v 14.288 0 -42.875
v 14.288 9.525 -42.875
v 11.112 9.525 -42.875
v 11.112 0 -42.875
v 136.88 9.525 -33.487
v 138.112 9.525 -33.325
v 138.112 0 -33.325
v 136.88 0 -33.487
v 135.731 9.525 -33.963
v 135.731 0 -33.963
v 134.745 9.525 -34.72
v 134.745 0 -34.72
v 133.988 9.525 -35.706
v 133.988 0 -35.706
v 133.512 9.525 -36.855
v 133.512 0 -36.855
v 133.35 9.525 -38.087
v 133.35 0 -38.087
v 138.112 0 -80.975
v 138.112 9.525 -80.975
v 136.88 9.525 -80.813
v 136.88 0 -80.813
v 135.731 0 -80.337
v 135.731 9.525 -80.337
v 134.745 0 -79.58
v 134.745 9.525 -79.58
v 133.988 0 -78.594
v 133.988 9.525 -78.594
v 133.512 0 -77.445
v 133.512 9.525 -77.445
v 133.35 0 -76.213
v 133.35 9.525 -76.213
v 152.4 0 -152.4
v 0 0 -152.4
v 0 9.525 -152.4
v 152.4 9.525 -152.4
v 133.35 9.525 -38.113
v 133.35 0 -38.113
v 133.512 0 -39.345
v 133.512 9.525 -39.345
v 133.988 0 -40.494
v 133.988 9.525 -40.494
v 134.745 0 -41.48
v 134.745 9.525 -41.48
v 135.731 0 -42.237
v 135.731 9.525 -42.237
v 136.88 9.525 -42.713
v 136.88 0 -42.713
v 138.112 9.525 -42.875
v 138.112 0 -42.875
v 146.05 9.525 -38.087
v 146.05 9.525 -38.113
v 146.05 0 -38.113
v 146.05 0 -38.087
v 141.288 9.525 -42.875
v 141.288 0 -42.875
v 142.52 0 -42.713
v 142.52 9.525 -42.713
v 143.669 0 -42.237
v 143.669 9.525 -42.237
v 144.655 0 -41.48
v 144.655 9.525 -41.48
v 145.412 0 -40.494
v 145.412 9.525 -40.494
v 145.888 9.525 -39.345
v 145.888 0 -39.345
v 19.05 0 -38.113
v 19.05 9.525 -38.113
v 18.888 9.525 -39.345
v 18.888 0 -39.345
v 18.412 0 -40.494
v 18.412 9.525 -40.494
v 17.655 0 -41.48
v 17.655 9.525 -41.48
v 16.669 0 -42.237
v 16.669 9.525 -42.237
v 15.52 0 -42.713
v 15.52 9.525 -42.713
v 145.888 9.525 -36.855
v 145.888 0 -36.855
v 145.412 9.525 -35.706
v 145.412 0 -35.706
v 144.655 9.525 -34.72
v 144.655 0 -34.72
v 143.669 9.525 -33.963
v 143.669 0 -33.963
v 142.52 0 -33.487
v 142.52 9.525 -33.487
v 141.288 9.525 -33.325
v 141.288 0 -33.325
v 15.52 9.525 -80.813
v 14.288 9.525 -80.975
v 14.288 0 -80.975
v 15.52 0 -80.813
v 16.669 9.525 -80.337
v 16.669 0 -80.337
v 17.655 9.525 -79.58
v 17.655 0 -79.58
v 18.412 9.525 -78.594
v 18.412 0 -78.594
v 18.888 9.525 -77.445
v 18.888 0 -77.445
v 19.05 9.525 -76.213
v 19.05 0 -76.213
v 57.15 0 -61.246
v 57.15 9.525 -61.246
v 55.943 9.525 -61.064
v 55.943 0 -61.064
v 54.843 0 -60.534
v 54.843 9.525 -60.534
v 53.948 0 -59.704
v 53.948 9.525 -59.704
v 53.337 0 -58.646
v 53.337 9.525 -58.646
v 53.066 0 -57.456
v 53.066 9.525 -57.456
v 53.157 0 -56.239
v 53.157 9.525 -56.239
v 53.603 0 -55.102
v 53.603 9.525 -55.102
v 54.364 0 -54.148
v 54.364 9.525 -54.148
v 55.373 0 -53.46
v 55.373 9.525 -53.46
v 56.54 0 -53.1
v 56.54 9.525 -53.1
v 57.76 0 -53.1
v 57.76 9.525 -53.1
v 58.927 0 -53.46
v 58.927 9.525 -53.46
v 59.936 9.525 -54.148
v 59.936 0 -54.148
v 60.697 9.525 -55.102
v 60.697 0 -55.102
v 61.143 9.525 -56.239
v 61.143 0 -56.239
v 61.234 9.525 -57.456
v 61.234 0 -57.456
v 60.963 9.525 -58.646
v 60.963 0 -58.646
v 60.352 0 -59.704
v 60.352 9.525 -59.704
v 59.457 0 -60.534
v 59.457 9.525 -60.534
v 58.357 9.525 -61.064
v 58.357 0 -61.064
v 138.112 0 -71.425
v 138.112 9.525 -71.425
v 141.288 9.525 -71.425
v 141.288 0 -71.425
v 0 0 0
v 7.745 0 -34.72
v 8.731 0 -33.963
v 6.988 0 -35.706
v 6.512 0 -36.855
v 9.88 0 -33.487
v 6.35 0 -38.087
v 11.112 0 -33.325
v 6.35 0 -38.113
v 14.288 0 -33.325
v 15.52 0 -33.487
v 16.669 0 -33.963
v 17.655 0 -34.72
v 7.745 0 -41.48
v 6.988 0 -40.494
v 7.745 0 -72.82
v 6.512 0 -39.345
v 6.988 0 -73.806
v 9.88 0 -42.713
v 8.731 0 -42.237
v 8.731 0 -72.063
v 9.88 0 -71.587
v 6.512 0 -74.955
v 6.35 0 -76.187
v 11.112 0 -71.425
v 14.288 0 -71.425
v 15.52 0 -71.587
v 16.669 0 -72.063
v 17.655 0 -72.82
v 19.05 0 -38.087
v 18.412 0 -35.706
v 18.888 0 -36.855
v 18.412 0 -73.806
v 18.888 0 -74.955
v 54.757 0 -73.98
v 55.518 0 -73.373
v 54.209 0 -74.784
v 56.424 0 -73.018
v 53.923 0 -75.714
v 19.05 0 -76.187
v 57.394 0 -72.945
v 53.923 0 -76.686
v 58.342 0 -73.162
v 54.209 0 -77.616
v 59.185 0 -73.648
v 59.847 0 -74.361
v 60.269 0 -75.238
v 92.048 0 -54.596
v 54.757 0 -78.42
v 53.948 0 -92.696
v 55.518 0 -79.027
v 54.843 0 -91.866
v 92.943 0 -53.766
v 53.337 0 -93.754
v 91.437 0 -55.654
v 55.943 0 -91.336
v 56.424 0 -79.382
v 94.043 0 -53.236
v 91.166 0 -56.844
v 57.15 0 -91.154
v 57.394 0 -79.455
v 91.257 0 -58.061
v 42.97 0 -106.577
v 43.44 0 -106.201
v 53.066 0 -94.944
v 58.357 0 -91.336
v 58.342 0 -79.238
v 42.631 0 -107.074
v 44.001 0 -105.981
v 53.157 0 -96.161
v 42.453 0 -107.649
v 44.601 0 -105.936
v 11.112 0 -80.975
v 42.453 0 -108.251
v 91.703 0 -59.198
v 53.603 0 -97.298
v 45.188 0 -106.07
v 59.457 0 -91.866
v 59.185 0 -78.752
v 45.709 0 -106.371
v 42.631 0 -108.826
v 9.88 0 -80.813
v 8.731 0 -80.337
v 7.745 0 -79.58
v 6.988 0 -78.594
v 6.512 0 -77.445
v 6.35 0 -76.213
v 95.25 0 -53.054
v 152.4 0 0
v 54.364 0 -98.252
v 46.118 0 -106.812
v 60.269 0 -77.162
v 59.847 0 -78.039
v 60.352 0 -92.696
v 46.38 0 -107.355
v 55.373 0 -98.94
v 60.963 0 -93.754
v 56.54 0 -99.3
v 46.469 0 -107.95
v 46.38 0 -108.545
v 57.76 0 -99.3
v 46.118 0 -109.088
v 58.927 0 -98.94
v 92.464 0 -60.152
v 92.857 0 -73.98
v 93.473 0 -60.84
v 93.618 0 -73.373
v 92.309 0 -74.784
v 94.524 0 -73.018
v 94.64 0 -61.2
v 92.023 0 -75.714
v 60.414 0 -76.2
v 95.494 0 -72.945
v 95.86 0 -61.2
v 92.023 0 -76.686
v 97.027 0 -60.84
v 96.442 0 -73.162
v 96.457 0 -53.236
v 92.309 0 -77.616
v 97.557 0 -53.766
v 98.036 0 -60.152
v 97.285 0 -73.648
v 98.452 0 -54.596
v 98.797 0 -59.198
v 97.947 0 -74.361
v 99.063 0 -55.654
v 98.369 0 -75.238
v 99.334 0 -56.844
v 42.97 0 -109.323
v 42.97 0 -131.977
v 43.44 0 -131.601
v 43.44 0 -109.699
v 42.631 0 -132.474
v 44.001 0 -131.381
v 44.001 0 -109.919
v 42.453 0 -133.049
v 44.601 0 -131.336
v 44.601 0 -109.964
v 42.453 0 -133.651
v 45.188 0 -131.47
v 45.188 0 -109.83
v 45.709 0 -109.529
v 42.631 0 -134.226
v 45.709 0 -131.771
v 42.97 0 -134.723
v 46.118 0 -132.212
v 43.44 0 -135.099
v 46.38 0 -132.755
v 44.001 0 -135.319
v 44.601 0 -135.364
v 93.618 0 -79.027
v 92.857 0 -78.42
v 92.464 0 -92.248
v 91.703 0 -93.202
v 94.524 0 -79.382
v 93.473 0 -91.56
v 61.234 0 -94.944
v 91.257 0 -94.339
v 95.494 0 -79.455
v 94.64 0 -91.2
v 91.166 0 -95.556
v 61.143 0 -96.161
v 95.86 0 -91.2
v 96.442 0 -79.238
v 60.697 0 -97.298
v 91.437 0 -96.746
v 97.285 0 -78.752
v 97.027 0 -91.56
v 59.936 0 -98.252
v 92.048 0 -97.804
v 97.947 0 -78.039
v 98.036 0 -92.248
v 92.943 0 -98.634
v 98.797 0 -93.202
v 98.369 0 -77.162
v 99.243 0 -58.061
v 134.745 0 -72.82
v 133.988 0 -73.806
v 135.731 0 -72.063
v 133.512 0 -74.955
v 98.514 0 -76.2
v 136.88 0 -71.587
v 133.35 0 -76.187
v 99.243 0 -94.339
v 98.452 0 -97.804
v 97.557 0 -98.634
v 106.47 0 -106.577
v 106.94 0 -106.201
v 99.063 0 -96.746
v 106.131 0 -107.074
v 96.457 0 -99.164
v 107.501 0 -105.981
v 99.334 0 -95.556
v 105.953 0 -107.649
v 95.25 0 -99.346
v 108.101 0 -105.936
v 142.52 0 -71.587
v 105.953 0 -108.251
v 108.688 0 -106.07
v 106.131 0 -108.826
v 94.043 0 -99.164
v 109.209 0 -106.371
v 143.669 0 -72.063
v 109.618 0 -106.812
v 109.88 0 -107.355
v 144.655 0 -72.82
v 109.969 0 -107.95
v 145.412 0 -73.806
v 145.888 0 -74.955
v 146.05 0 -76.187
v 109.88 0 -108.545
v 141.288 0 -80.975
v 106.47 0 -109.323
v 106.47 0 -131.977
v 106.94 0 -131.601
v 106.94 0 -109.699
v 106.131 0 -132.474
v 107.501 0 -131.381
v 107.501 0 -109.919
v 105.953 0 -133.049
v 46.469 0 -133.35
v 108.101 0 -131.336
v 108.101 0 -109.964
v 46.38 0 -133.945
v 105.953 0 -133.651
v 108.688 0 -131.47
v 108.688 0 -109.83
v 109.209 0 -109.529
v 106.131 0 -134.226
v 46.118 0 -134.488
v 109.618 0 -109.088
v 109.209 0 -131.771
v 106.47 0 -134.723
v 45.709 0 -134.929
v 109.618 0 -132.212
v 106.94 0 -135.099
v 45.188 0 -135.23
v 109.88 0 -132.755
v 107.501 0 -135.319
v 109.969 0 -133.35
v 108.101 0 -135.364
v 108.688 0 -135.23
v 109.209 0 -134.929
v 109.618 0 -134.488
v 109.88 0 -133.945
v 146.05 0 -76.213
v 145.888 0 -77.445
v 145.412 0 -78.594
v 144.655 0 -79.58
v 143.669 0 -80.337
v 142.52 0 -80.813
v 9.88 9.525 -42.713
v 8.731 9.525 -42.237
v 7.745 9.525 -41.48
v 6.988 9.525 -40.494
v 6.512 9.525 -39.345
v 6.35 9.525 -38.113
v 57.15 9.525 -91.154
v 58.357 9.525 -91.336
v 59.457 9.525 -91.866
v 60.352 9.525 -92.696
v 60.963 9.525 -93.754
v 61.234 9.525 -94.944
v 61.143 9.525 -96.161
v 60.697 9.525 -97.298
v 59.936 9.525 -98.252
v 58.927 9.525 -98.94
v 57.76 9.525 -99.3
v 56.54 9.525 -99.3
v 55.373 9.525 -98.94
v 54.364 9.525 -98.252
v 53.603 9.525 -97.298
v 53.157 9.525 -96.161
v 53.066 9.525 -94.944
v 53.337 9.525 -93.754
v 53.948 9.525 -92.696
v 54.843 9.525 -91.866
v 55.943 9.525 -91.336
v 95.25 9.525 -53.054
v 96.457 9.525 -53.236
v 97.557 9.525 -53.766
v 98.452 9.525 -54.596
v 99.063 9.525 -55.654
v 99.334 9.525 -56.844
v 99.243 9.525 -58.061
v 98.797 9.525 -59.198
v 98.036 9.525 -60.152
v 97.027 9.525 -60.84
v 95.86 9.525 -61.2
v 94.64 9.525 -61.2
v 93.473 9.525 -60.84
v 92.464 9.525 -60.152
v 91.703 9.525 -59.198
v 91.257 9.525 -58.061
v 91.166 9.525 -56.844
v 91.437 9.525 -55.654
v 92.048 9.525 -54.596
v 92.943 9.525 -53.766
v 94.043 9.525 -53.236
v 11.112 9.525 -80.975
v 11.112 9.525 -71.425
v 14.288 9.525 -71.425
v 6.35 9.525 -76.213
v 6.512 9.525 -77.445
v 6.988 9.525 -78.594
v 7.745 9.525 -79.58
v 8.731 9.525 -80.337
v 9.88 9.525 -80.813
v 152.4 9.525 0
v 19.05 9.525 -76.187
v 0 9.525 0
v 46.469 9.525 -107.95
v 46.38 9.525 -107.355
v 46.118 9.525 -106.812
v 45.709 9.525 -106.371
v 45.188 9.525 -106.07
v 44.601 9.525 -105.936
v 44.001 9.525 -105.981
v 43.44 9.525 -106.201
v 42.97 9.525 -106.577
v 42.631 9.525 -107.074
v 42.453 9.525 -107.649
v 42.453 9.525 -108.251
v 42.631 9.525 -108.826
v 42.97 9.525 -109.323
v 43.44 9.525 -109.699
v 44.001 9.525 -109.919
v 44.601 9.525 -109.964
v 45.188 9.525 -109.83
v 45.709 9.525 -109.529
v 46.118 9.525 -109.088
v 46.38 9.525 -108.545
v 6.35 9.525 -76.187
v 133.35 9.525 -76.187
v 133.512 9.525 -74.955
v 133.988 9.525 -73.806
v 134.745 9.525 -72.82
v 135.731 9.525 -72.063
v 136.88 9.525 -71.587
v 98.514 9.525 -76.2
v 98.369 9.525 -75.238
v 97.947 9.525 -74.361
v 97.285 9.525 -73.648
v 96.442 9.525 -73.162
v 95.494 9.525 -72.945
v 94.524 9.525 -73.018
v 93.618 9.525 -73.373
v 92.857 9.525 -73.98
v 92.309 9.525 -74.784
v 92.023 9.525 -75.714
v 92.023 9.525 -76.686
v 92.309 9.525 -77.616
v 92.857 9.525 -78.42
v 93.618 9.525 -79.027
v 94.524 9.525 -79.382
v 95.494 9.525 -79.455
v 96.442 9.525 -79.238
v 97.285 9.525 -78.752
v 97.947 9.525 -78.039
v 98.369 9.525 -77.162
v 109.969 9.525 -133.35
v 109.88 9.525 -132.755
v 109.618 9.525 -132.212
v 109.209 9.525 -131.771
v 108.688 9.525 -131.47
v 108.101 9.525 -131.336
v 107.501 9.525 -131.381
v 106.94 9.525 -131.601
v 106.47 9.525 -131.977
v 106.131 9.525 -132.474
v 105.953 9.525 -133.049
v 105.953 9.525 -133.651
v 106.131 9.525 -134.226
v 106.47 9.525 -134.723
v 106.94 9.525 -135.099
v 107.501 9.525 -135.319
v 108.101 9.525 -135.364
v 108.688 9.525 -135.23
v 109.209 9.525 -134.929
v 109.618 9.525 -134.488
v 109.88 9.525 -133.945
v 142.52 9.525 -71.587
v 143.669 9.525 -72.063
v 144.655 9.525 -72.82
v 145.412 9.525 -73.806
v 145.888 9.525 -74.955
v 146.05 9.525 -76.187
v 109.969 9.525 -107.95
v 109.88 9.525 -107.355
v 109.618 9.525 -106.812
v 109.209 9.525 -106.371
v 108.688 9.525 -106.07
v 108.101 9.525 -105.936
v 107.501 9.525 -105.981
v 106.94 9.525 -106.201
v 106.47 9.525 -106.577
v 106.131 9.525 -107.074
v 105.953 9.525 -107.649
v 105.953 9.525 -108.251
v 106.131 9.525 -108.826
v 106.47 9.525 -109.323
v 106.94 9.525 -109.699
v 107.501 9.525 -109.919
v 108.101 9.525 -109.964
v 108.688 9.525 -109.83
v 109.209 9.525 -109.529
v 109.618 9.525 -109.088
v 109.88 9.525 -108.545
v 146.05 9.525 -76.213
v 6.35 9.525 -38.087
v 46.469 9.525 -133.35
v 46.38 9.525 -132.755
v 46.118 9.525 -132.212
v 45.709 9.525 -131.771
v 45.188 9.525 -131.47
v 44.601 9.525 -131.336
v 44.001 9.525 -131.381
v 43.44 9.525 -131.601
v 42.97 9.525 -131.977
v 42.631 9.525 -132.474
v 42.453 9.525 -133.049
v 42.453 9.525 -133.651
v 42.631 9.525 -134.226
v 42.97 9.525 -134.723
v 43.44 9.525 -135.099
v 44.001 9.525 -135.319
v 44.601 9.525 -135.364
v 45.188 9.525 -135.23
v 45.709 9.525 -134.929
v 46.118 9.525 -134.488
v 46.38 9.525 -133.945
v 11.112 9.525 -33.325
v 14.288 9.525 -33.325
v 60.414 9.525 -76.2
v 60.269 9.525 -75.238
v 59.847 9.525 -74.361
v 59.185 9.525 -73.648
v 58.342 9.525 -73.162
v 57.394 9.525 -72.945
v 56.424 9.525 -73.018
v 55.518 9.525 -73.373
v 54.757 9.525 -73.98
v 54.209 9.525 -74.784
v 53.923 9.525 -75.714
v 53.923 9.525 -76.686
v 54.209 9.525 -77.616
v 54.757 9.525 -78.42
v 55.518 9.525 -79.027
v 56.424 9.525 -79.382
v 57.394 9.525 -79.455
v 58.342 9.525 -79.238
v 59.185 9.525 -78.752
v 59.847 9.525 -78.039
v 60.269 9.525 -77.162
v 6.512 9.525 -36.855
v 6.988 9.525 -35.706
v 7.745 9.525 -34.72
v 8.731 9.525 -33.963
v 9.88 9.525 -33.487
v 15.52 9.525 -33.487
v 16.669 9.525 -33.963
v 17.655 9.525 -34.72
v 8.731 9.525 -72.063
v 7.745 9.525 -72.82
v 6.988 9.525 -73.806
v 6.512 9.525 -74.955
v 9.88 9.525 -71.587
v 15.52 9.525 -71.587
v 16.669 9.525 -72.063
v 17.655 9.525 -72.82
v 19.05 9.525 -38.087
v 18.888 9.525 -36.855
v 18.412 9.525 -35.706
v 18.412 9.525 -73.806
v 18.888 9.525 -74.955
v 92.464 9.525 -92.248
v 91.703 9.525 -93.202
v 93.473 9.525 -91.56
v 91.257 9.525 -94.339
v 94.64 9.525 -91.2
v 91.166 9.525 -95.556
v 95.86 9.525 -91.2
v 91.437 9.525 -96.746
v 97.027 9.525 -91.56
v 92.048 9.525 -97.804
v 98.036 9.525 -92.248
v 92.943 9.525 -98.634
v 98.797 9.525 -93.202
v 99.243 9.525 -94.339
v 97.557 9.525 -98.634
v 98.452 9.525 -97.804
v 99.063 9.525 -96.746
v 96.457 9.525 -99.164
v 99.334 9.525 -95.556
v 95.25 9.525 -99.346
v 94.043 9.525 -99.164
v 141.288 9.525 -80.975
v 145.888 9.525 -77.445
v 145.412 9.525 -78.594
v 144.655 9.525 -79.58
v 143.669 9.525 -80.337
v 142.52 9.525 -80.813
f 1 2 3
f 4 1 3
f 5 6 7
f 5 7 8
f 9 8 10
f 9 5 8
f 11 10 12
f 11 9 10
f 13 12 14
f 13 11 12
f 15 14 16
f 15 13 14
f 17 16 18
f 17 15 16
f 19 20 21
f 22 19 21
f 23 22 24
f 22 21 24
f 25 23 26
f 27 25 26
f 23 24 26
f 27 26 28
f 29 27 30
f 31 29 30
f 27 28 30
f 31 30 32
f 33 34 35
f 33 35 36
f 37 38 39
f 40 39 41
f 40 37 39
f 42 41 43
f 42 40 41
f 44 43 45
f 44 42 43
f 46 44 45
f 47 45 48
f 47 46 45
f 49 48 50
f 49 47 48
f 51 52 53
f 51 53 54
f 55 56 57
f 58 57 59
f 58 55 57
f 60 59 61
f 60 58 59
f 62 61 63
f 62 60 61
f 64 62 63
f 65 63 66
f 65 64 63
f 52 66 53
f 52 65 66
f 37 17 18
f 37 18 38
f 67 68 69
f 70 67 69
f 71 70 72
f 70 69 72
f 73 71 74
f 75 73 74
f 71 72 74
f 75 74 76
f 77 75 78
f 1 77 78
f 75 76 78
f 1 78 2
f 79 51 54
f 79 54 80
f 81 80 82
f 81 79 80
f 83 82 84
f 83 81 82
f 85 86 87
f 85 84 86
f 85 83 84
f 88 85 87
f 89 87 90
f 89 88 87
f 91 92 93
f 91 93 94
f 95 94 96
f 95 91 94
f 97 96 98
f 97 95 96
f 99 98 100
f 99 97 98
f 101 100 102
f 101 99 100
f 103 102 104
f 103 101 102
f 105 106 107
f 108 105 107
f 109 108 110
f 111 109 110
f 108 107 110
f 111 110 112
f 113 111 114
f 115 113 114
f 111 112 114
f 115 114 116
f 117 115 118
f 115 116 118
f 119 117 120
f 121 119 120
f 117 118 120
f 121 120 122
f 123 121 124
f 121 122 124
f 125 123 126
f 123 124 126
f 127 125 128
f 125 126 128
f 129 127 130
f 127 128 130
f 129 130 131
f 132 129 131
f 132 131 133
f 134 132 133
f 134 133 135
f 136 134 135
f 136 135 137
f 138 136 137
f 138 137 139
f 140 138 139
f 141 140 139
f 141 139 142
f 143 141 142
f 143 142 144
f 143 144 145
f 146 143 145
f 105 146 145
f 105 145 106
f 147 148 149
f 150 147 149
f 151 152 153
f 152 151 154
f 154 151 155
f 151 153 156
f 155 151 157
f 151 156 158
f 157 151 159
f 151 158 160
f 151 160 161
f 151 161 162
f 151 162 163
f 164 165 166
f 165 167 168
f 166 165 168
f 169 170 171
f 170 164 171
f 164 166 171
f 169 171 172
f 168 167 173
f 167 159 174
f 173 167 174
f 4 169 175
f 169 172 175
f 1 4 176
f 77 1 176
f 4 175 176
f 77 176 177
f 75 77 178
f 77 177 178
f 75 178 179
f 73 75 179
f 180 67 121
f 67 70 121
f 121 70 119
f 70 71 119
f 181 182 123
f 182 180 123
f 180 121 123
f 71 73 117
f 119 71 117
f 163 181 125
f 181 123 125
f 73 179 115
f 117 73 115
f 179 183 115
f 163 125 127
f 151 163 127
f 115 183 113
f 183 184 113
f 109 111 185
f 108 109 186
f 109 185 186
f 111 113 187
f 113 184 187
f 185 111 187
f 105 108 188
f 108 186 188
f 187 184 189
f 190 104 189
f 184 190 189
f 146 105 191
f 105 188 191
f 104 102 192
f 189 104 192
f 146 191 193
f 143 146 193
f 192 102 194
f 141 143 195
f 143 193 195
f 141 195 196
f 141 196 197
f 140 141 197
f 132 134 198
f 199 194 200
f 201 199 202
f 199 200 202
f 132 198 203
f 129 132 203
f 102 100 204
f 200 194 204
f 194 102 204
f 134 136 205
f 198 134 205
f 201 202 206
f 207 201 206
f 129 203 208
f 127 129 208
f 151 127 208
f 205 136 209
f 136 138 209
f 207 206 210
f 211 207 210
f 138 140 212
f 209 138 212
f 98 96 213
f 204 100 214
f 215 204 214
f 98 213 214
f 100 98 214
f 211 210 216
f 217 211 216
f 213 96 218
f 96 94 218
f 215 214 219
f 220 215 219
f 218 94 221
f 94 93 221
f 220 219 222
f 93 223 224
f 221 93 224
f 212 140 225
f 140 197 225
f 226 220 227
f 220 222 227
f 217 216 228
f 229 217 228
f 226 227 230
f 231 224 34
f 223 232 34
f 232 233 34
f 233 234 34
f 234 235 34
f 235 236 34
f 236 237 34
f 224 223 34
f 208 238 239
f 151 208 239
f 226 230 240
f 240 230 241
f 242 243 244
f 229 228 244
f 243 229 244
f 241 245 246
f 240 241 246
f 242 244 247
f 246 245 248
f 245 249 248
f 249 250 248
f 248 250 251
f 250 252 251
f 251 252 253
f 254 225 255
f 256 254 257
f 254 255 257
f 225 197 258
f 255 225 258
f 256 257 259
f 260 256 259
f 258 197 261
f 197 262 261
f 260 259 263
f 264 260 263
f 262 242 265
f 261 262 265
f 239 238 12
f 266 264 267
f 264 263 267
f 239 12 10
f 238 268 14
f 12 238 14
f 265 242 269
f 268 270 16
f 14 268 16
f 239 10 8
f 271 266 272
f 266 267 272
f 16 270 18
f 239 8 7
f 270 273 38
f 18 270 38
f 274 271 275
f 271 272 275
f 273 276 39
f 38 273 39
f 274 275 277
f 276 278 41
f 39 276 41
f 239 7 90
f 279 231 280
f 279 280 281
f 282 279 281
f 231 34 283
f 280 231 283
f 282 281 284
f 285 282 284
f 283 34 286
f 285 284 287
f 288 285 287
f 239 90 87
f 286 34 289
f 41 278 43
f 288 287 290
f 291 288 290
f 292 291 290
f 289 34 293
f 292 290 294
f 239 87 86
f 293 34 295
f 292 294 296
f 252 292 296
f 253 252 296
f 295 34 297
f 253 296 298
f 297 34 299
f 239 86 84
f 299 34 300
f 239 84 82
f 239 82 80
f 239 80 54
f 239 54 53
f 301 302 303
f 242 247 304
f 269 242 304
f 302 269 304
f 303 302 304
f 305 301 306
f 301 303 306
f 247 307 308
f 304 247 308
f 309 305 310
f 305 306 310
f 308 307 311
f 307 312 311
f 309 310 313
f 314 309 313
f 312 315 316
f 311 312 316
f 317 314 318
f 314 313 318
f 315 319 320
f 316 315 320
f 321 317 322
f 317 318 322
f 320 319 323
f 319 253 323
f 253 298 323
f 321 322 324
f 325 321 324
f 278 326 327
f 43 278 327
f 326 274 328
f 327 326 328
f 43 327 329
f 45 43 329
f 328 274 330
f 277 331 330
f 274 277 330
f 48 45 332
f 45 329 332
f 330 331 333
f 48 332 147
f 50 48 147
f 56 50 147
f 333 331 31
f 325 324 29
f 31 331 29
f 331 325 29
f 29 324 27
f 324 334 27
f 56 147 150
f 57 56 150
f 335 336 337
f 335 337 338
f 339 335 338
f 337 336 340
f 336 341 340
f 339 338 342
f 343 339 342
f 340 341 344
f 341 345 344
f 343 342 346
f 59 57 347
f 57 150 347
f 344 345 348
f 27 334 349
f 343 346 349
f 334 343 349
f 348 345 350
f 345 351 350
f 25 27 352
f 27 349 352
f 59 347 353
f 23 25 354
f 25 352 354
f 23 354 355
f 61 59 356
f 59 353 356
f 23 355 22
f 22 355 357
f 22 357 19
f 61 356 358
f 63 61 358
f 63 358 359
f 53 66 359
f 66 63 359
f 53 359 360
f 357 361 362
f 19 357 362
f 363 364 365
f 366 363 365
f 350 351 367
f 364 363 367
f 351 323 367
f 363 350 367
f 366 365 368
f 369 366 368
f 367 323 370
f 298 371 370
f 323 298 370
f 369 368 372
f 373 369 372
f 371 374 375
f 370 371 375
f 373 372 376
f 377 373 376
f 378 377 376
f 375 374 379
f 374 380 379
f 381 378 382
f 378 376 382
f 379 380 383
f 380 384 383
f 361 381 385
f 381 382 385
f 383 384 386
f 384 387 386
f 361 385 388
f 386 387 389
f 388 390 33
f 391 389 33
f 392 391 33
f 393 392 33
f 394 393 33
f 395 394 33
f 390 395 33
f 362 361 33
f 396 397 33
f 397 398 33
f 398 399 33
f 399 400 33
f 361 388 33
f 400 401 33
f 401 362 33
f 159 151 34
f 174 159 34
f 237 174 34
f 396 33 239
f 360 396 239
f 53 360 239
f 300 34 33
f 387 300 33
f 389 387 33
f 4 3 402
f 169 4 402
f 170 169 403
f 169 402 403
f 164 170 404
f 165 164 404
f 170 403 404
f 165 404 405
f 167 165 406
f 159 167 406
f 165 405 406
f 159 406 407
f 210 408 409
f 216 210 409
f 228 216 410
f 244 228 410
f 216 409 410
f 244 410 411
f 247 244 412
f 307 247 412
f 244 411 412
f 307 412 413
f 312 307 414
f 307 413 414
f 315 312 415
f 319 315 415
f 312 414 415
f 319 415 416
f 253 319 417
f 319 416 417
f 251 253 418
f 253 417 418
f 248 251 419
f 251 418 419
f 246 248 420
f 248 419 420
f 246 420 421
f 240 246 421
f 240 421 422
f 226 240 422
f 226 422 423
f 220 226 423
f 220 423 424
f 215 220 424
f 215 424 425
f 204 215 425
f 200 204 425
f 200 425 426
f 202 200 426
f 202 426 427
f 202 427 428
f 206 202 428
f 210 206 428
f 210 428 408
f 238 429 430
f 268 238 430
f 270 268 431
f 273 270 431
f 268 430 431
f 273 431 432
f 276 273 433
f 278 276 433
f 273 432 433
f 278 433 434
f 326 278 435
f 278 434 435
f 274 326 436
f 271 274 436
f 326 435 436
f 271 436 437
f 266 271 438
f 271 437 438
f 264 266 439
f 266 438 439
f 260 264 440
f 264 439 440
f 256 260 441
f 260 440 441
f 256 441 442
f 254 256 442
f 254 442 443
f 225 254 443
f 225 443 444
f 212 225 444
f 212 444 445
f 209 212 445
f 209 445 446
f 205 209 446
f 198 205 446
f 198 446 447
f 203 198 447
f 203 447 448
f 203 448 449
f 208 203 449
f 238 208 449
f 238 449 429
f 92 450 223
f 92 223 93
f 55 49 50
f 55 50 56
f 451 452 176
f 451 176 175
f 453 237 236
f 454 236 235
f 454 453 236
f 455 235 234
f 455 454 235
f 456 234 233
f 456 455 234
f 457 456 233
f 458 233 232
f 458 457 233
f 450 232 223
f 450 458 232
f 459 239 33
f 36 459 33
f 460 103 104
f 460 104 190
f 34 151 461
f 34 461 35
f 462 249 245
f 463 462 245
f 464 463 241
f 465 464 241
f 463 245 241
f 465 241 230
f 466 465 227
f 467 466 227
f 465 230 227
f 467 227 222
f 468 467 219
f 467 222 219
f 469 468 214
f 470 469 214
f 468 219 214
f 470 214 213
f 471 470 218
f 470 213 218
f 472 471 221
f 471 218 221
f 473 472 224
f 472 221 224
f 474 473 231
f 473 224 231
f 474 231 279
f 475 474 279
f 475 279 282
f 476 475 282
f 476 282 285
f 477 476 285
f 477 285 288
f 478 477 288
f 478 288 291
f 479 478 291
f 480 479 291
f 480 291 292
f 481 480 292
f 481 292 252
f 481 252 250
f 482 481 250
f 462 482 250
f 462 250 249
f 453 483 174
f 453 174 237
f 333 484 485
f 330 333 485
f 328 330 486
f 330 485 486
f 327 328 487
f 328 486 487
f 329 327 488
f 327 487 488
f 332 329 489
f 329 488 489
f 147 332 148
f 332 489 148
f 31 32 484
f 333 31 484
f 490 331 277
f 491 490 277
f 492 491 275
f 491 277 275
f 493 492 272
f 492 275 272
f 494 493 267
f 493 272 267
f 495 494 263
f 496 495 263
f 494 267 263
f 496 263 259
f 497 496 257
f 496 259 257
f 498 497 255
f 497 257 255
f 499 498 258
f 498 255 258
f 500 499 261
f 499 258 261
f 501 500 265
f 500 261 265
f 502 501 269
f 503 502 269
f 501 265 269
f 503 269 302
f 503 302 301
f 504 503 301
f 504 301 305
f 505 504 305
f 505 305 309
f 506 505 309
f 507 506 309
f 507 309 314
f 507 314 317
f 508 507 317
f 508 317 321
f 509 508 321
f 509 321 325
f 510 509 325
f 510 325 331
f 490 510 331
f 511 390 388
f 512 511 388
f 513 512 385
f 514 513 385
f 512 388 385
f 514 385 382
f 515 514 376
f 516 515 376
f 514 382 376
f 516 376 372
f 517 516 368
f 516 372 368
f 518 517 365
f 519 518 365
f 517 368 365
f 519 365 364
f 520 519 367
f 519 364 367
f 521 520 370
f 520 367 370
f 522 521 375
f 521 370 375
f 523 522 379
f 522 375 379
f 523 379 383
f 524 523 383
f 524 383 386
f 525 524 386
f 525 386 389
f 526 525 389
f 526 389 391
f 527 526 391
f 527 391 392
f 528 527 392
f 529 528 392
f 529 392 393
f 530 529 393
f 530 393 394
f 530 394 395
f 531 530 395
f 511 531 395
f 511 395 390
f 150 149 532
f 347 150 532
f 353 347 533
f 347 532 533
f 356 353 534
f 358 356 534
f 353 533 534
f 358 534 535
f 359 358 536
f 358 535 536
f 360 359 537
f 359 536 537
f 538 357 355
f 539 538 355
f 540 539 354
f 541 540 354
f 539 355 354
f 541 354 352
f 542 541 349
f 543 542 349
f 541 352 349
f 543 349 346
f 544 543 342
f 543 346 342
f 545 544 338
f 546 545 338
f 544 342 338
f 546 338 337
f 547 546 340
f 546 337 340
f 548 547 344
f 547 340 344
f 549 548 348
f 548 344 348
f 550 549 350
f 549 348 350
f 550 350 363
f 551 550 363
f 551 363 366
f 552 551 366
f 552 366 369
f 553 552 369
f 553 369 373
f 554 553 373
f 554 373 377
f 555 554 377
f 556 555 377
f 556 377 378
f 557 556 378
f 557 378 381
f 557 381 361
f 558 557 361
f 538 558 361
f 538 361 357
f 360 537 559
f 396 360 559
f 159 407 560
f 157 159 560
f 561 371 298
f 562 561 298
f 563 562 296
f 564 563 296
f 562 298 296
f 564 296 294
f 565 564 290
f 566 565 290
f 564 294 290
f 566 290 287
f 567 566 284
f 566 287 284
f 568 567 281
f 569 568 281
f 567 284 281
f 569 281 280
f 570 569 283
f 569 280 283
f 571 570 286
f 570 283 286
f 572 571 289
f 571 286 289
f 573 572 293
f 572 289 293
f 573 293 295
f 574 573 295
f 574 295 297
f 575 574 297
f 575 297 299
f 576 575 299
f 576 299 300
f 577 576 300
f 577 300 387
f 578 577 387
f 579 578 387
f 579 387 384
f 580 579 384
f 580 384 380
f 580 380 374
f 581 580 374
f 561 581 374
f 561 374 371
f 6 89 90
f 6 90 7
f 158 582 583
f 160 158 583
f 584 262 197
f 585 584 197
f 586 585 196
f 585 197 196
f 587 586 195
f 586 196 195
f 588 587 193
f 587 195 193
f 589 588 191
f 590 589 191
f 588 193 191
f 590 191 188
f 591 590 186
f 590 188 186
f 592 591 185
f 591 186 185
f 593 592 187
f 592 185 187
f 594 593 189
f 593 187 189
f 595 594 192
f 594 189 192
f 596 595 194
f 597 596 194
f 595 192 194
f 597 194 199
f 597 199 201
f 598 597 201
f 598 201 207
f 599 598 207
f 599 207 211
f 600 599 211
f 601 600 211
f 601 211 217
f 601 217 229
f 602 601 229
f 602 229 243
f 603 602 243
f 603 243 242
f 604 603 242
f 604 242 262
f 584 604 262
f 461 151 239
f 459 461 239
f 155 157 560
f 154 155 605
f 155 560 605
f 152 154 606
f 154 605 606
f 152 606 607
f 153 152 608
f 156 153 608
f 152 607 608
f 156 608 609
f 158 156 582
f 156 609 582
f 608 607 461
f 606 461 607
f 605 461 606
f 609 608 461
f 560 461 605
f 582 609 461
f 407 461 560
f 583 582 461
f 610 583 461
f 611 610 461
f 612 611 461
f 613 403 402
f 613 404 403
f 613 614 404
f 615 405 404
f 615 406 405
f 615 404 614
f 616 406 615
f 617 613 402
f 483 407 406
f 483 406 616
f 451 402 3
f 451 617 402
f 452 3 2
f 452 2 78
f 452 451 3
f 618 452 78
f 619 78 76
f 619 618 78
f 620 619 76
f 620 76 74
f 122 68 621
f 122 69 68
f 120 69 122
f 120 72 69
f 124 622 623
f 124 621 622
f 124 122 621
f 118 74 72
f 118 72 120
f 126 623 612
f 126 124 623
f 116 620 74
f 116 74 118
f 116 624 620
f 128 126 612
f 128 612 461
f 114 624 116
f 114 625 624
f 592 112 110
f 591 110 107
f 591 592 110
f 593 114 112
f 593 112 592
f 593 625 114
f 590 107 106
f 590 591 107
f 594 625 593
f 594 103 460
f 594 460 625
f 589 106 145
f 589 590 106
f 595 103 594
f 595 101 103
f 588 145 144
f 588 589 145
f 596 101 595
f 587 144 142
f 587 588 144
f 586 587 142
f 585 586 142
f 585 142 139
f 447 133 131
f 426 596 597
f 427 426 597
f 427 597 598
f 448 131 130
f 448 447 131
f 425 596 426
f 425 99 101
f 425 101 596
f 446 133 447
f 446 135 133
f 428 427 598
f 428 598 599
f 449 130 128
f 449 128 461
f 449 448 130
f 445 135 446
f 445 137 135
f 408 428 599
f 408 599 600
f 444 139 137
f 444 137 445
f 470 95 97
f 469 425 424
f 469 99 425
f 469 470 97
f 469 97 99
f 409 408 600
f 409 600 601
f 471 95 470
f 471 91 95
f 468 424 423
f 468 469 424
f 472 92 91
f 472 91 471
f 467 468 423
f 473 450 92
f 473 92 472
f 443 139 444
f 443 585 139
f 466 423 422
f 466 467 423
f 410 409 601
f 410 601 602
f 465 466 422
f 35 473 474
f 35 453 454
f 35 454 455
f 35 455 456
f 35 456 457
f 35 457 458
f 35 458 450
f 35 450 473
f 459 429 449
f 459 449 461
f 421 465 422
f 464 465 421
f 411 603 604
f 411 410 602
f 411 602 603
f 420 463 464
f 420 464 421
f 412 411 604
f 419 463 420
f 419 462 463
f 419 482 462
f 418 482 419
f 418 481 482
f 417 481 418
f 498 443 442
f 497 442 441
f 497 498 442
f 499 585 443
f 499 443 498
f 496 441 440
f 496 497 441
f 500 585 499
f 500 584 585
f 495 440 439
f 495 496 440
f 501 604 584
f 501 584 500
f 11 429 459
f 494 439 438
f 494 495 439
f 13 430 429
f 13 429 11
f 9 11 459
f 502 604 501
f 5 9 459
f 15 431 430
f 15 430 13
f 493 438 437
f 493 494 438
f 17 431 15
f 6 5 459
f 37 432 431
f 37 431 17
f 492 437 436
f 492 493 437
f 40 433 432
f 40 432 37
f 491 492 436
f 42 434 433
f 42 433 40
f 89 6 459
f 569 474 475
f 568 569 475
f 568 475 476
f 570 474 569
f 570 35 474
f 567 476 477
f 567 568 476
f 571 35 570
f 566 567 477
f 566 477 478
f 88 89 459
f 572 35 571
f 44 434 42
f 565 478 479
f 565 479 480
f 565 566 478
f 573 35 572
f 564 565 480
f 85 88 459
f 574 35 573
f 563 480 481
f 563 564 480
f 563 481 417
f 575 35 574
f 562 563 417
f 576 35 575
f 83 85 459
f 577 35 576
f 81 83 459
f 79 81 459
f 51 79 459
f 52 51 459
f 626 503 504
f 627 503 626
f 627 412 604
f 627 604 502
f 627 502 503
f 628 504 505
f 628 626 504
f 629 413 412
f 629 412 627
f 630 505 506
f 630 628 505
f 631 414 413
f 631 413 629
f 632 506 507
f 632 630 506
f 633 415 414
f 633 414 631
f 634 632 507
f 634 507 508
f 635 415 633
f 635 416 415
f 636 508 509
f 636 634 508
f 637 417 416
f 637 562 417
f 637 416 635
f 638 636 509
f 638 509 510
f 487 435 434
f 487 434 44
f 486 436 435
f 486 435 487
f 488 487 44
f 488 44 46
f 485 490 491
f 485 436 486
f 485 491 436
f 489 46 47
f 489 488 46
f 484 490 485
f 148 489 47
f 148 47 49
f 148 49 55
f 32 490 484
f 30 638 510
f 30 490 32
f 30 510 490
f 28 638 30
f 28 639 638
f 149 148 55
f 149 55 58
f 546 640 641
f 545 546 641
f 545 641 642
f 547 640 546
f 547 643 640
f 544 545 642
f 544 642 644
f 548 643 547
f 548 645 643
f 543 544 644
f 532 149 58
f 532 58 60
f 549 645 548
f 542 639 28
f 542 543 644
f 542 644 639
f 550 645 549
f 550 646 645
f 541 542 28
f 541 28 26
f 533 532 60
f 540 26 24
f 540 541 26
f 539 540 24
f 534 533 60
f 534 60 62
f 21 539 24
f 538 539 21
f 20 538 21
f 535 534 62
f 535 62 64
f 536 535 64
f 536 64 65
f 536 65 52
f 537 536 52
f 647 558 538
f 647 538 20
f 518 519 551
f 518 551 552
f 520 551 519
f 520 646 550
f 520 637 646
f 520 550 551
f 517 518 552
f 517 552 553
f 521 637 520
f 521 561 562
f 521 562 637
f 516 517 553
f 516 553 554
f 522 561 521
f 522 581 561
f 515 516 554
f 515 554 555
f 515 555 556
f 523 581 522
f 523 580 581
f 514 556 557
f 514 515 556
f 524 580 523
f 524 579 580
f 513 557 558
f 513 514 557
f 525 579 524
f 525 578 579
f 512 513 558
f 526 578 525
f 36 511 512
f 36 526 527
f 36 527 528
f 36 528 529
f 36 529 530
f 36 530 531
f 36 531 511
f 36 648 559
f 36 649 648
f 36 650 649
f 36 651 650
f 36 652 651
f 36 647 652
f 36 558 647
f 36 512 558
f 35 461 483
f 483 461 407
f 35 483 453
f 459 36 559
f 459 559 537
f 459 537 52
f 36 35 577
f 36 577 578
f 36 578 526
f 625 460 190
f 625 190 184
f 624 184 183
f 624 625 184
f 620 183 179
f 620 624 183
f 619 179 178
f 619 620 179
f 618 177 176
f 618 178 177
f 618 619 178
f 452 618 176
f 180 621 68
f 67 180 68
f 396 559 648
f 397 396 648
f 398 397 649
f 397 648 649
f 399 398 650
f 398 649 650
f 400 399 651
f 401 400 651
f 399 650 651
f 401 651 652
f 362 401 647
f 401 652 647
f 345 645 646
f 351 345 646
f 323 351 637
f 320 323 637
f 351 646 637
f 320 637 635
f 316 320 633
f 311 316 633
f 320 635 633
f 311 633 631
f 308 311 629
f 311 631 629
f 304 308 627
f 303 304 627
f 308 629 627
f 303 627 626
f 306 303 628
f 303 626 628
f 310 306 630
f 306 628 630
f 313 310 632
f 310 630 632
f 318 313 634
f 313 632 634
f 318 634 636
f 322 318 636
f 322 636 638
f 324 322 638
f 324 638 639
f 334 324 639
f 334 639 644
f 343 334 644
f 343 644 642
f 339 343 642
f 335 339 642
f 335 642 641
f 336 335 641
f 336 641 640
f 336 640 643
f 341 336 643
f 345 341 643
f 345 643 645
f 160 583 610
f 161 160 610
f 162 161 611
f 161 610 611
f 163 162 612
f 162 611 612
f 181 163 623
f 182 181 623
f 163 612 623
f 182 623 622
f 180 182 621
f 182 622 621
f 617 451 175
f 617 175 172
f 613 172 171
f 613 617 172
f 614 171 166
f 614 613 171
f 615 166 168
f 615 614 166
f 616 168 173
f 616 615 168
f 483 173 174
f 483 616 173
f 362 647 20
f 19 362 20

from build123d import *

# Parameters (mm, degrees)
SKETCH1_W                    = 152.4
SKETCH1_H                    = 152.4
EXTRUDE1_DEPTH               = 9.525
CUT_EXTRUDE1_DEPTH           = 10.525
F_10_32_TAPPED_HOLE1_D       = 4.0386
F_10_32_TAPPED_HOLE1_DEPTH   = 13.6144
F_10_32_TAPPED_HOLE1_TIP     = 1.213317848
SKETCH5_R                    = 4.09575
CUT_EXTRUDE2_DEPTH           = 10.525
F_5_16_18_TAPPED_HOLE1_D     = 6.5278
F_5_16_18_TAPPED_HOLE1_DEPTH = 22.9362
F_5_16_18_TAPPED_HOLE1_TIP   = 1.961148974


with BuildPart() as part:
    # Sketch1 → Extrude1 (new body)
    with BuildSketch(Plane(origin=(0, 0, 0), x_dir=(1, 0, 0), z_dir=(0, 1, 0))):
        with Locations((76.2, 76.2)):
            Rectangle(SKETCH1_W, SKETCH1_H)
    extrude(amount=EXTRUDE1_DEPTH)

    # Sketch2 → Cut-Extrude1 (cut, through all)
    with BuildSketch(Plane(origin=(0, 9.525, 0), x_dir=(1, 0, 0), z_dir=(0, 1, 0))):
        with BuildLine():
            Line((141.2875, 33.3248), (138.1125, 33.3248))
            ThreePointArc((138.1125, 33.3248), (134.744903955, 34.719703955), (133.35, 38.0873))
            Line((133.35, 38.0873), (133.35, 38.1127))
            ThreePointArc((133.35, 38.1127), (134.744903955, 41.480296045), (138.1125, 42.8752))
            Line((138.1125, 42.8752), (141.2875, 42.8752))
            ThreePointArc((141.2875, 42.8752), (144.655096045, 41.480296045), (146.05, 38.1127))
            Line((146.05, 38.1127), (146.05, 38.0873))
            ThreePointArc((146.05, 38.0873), (144.655096045, 34.719703955), (141.2875, 33.3248))
        make_face()
        with BuildLine():
            Line((19.05, 38.0873), (19.05, 38.1127))
            ThreePointArc((19.05, 38.1127), (17.655096045, 41.480296045), (14.2875, 42.8752))
            Line((14.2875, 42.8752), (11.1125, 42.8752))
            ThreePointArc((11.1125, 42.8752), (7.744903955, 41.480296045), (6.35, 38.1127))
            Line((6.35, 38.1127), (6.35, 38.0873))
            ThreePointArc((6.35, 38.0873), (7.744903955, 34.719703955), (11.1125, 33.3248))
            Line((11.1125, 33.3248), (14.2875, 33.3248))
            ThreePointArc((14.2875, 33.3248), (17.655096045, 34.719703955), (19.05, 38.0873))
        make_face()
        with BuildLine():
            Line((11.1125, 80.9752), (14.2875, 80.9752))
            ThreePointArc((14.2875, 80.9752), (17.655096045, 79.580296045), (19.05, 76.2127))
            Line((19.05, 76.2127), (19.05, 76.1873))
            ThreePointArc((19.05, 76.1873), (17.655096045, 72.819703955), (14.2875, 71.4248))
            Line((14.2875, 71.4248), (11.1125, 71.4248))
            ThreePointArc((11.1125, 71.4248), (7.744903955, 72.819703955), (6.35, 76.1873))
            Line((6.35, 76.1873), (6.35, 76.2127))
            ThreePointArc((6.35, 76.2127), (7.744903955, 79.580296045), (11.1125, 80.9752))
        make_face()
        with BuildLine():
            Line((133.35, 76.2127), (133.35, 76.1873))
            ThreePointArc((133.35, 76.1873), (134.744903955, 72.819703955), (138.1125, 71.4248))
            Line((138.1125, 71.4248), (141.2875, 71.4248))
            ThreePointArc((141.2875, 71.4248), (144.655096045, 72.819703955), (146.05, 76.1873))
            Line((146.05, 76.1873), (146.05, 76.2127))
            ThreePointArc((146.05, 76.2127), (144.655096045, 79.580296045), (141.2875, 80.9752))
            Line((141.2875, 80.9752), (138.1125, 80.9752))
            ThreePointArc((138.1125, 80.9752), (134.744903955, 79.580296045), (133.35, 76.2127))
        make_face()
    extrude(amount=-CUT_EXTRUDE1_DEPTH, mode=Mode.SUBTRACT)

    # #10-32 Tapped Hole1
    with Locations(Plane(origin=(0, 9.525, 0), x_dir=(-1, 0, 0), z_dir=(0, 1, 0))):
        with Locations((-44.45, -107.95), (-107.95, -107.95), (-107.95, -133.35), (-44.45, -133.35)):
            Hole(F_10_32_TAPPED_HOLE1_D / 2, depth=F_10_32_TAPPED_HOLE1_DEPTH)
            with Locations((0, 0, -(F_10_32_TAPPED_HOLE1_DEPTH + F_10_32_TAPPED_HOLE1_TIP / 2))):  # 118° drill point
                Cone(0, F_10_32_TAPPED_HOLE1_D / 2, F_10_32_TAPPED_HOLE1_TIP, mode=Mode.SUBTRACT)

    # Sketch5 → Cut-Extrude2 (cut, through all)
    with BuildSketch(Plane(origin=(0, 9.525, 0), x_dir=(1, 0, 0), z_dir=(0, 1, 0))):
        with Locations(Location((57.15, 95.25, 0), (0, 0, 270))):  # turned: the seam where the file's is
            Circle(SKETCH5_R)
        with Locations(Location((95.25, 95.25, 0), (0, 0, 90))):  # turned: the seam where the file's is
            Circle(SKETCH5_R)
        with Locations(Location((57.15, 57.15, 0), (0, 0, 90))):  # turned: the seam where the file's is
            Circle(SKETCH5_R)
        with Locations(Location((95.25, 57.15, 0), (0, 0, 270))):  # turned: the seam where the file's is
            Circle(SKETCH5_R)
    extrude(amount=-CUT_EXTRUDE2_DEPTH, mode=Mode.SUBTRACT)

    # 5/16-18 Tapped Hole1
    with Locations(Plane(origin=(0, 9.525, 0), x_dir=(-1, 0, 0), z_dir=(0, 1, 0))):
        with Locations((-57.15, -76.2), (-95.25, -76.2)):
            Hole(F_5_16_18_TAPPED_HOLE1_D / 2, depth=F_5_16_18_TAPPED_HOLE1_DEPTH)
            with Locations((0, 0, -(F_5_16_18_TAPPED_HOLE1_DEPTH + F_5_16_18_TAPPED_HOLE1_TIP / 2))):  # 118° drill point
                Cone(0, F_5_16_18_TAPPED_HOLE1_D / 2, F_5_16_18_TAPPED_HOLE1_TIP, mode=Mode.SUBTRACT)


solid = part.part
